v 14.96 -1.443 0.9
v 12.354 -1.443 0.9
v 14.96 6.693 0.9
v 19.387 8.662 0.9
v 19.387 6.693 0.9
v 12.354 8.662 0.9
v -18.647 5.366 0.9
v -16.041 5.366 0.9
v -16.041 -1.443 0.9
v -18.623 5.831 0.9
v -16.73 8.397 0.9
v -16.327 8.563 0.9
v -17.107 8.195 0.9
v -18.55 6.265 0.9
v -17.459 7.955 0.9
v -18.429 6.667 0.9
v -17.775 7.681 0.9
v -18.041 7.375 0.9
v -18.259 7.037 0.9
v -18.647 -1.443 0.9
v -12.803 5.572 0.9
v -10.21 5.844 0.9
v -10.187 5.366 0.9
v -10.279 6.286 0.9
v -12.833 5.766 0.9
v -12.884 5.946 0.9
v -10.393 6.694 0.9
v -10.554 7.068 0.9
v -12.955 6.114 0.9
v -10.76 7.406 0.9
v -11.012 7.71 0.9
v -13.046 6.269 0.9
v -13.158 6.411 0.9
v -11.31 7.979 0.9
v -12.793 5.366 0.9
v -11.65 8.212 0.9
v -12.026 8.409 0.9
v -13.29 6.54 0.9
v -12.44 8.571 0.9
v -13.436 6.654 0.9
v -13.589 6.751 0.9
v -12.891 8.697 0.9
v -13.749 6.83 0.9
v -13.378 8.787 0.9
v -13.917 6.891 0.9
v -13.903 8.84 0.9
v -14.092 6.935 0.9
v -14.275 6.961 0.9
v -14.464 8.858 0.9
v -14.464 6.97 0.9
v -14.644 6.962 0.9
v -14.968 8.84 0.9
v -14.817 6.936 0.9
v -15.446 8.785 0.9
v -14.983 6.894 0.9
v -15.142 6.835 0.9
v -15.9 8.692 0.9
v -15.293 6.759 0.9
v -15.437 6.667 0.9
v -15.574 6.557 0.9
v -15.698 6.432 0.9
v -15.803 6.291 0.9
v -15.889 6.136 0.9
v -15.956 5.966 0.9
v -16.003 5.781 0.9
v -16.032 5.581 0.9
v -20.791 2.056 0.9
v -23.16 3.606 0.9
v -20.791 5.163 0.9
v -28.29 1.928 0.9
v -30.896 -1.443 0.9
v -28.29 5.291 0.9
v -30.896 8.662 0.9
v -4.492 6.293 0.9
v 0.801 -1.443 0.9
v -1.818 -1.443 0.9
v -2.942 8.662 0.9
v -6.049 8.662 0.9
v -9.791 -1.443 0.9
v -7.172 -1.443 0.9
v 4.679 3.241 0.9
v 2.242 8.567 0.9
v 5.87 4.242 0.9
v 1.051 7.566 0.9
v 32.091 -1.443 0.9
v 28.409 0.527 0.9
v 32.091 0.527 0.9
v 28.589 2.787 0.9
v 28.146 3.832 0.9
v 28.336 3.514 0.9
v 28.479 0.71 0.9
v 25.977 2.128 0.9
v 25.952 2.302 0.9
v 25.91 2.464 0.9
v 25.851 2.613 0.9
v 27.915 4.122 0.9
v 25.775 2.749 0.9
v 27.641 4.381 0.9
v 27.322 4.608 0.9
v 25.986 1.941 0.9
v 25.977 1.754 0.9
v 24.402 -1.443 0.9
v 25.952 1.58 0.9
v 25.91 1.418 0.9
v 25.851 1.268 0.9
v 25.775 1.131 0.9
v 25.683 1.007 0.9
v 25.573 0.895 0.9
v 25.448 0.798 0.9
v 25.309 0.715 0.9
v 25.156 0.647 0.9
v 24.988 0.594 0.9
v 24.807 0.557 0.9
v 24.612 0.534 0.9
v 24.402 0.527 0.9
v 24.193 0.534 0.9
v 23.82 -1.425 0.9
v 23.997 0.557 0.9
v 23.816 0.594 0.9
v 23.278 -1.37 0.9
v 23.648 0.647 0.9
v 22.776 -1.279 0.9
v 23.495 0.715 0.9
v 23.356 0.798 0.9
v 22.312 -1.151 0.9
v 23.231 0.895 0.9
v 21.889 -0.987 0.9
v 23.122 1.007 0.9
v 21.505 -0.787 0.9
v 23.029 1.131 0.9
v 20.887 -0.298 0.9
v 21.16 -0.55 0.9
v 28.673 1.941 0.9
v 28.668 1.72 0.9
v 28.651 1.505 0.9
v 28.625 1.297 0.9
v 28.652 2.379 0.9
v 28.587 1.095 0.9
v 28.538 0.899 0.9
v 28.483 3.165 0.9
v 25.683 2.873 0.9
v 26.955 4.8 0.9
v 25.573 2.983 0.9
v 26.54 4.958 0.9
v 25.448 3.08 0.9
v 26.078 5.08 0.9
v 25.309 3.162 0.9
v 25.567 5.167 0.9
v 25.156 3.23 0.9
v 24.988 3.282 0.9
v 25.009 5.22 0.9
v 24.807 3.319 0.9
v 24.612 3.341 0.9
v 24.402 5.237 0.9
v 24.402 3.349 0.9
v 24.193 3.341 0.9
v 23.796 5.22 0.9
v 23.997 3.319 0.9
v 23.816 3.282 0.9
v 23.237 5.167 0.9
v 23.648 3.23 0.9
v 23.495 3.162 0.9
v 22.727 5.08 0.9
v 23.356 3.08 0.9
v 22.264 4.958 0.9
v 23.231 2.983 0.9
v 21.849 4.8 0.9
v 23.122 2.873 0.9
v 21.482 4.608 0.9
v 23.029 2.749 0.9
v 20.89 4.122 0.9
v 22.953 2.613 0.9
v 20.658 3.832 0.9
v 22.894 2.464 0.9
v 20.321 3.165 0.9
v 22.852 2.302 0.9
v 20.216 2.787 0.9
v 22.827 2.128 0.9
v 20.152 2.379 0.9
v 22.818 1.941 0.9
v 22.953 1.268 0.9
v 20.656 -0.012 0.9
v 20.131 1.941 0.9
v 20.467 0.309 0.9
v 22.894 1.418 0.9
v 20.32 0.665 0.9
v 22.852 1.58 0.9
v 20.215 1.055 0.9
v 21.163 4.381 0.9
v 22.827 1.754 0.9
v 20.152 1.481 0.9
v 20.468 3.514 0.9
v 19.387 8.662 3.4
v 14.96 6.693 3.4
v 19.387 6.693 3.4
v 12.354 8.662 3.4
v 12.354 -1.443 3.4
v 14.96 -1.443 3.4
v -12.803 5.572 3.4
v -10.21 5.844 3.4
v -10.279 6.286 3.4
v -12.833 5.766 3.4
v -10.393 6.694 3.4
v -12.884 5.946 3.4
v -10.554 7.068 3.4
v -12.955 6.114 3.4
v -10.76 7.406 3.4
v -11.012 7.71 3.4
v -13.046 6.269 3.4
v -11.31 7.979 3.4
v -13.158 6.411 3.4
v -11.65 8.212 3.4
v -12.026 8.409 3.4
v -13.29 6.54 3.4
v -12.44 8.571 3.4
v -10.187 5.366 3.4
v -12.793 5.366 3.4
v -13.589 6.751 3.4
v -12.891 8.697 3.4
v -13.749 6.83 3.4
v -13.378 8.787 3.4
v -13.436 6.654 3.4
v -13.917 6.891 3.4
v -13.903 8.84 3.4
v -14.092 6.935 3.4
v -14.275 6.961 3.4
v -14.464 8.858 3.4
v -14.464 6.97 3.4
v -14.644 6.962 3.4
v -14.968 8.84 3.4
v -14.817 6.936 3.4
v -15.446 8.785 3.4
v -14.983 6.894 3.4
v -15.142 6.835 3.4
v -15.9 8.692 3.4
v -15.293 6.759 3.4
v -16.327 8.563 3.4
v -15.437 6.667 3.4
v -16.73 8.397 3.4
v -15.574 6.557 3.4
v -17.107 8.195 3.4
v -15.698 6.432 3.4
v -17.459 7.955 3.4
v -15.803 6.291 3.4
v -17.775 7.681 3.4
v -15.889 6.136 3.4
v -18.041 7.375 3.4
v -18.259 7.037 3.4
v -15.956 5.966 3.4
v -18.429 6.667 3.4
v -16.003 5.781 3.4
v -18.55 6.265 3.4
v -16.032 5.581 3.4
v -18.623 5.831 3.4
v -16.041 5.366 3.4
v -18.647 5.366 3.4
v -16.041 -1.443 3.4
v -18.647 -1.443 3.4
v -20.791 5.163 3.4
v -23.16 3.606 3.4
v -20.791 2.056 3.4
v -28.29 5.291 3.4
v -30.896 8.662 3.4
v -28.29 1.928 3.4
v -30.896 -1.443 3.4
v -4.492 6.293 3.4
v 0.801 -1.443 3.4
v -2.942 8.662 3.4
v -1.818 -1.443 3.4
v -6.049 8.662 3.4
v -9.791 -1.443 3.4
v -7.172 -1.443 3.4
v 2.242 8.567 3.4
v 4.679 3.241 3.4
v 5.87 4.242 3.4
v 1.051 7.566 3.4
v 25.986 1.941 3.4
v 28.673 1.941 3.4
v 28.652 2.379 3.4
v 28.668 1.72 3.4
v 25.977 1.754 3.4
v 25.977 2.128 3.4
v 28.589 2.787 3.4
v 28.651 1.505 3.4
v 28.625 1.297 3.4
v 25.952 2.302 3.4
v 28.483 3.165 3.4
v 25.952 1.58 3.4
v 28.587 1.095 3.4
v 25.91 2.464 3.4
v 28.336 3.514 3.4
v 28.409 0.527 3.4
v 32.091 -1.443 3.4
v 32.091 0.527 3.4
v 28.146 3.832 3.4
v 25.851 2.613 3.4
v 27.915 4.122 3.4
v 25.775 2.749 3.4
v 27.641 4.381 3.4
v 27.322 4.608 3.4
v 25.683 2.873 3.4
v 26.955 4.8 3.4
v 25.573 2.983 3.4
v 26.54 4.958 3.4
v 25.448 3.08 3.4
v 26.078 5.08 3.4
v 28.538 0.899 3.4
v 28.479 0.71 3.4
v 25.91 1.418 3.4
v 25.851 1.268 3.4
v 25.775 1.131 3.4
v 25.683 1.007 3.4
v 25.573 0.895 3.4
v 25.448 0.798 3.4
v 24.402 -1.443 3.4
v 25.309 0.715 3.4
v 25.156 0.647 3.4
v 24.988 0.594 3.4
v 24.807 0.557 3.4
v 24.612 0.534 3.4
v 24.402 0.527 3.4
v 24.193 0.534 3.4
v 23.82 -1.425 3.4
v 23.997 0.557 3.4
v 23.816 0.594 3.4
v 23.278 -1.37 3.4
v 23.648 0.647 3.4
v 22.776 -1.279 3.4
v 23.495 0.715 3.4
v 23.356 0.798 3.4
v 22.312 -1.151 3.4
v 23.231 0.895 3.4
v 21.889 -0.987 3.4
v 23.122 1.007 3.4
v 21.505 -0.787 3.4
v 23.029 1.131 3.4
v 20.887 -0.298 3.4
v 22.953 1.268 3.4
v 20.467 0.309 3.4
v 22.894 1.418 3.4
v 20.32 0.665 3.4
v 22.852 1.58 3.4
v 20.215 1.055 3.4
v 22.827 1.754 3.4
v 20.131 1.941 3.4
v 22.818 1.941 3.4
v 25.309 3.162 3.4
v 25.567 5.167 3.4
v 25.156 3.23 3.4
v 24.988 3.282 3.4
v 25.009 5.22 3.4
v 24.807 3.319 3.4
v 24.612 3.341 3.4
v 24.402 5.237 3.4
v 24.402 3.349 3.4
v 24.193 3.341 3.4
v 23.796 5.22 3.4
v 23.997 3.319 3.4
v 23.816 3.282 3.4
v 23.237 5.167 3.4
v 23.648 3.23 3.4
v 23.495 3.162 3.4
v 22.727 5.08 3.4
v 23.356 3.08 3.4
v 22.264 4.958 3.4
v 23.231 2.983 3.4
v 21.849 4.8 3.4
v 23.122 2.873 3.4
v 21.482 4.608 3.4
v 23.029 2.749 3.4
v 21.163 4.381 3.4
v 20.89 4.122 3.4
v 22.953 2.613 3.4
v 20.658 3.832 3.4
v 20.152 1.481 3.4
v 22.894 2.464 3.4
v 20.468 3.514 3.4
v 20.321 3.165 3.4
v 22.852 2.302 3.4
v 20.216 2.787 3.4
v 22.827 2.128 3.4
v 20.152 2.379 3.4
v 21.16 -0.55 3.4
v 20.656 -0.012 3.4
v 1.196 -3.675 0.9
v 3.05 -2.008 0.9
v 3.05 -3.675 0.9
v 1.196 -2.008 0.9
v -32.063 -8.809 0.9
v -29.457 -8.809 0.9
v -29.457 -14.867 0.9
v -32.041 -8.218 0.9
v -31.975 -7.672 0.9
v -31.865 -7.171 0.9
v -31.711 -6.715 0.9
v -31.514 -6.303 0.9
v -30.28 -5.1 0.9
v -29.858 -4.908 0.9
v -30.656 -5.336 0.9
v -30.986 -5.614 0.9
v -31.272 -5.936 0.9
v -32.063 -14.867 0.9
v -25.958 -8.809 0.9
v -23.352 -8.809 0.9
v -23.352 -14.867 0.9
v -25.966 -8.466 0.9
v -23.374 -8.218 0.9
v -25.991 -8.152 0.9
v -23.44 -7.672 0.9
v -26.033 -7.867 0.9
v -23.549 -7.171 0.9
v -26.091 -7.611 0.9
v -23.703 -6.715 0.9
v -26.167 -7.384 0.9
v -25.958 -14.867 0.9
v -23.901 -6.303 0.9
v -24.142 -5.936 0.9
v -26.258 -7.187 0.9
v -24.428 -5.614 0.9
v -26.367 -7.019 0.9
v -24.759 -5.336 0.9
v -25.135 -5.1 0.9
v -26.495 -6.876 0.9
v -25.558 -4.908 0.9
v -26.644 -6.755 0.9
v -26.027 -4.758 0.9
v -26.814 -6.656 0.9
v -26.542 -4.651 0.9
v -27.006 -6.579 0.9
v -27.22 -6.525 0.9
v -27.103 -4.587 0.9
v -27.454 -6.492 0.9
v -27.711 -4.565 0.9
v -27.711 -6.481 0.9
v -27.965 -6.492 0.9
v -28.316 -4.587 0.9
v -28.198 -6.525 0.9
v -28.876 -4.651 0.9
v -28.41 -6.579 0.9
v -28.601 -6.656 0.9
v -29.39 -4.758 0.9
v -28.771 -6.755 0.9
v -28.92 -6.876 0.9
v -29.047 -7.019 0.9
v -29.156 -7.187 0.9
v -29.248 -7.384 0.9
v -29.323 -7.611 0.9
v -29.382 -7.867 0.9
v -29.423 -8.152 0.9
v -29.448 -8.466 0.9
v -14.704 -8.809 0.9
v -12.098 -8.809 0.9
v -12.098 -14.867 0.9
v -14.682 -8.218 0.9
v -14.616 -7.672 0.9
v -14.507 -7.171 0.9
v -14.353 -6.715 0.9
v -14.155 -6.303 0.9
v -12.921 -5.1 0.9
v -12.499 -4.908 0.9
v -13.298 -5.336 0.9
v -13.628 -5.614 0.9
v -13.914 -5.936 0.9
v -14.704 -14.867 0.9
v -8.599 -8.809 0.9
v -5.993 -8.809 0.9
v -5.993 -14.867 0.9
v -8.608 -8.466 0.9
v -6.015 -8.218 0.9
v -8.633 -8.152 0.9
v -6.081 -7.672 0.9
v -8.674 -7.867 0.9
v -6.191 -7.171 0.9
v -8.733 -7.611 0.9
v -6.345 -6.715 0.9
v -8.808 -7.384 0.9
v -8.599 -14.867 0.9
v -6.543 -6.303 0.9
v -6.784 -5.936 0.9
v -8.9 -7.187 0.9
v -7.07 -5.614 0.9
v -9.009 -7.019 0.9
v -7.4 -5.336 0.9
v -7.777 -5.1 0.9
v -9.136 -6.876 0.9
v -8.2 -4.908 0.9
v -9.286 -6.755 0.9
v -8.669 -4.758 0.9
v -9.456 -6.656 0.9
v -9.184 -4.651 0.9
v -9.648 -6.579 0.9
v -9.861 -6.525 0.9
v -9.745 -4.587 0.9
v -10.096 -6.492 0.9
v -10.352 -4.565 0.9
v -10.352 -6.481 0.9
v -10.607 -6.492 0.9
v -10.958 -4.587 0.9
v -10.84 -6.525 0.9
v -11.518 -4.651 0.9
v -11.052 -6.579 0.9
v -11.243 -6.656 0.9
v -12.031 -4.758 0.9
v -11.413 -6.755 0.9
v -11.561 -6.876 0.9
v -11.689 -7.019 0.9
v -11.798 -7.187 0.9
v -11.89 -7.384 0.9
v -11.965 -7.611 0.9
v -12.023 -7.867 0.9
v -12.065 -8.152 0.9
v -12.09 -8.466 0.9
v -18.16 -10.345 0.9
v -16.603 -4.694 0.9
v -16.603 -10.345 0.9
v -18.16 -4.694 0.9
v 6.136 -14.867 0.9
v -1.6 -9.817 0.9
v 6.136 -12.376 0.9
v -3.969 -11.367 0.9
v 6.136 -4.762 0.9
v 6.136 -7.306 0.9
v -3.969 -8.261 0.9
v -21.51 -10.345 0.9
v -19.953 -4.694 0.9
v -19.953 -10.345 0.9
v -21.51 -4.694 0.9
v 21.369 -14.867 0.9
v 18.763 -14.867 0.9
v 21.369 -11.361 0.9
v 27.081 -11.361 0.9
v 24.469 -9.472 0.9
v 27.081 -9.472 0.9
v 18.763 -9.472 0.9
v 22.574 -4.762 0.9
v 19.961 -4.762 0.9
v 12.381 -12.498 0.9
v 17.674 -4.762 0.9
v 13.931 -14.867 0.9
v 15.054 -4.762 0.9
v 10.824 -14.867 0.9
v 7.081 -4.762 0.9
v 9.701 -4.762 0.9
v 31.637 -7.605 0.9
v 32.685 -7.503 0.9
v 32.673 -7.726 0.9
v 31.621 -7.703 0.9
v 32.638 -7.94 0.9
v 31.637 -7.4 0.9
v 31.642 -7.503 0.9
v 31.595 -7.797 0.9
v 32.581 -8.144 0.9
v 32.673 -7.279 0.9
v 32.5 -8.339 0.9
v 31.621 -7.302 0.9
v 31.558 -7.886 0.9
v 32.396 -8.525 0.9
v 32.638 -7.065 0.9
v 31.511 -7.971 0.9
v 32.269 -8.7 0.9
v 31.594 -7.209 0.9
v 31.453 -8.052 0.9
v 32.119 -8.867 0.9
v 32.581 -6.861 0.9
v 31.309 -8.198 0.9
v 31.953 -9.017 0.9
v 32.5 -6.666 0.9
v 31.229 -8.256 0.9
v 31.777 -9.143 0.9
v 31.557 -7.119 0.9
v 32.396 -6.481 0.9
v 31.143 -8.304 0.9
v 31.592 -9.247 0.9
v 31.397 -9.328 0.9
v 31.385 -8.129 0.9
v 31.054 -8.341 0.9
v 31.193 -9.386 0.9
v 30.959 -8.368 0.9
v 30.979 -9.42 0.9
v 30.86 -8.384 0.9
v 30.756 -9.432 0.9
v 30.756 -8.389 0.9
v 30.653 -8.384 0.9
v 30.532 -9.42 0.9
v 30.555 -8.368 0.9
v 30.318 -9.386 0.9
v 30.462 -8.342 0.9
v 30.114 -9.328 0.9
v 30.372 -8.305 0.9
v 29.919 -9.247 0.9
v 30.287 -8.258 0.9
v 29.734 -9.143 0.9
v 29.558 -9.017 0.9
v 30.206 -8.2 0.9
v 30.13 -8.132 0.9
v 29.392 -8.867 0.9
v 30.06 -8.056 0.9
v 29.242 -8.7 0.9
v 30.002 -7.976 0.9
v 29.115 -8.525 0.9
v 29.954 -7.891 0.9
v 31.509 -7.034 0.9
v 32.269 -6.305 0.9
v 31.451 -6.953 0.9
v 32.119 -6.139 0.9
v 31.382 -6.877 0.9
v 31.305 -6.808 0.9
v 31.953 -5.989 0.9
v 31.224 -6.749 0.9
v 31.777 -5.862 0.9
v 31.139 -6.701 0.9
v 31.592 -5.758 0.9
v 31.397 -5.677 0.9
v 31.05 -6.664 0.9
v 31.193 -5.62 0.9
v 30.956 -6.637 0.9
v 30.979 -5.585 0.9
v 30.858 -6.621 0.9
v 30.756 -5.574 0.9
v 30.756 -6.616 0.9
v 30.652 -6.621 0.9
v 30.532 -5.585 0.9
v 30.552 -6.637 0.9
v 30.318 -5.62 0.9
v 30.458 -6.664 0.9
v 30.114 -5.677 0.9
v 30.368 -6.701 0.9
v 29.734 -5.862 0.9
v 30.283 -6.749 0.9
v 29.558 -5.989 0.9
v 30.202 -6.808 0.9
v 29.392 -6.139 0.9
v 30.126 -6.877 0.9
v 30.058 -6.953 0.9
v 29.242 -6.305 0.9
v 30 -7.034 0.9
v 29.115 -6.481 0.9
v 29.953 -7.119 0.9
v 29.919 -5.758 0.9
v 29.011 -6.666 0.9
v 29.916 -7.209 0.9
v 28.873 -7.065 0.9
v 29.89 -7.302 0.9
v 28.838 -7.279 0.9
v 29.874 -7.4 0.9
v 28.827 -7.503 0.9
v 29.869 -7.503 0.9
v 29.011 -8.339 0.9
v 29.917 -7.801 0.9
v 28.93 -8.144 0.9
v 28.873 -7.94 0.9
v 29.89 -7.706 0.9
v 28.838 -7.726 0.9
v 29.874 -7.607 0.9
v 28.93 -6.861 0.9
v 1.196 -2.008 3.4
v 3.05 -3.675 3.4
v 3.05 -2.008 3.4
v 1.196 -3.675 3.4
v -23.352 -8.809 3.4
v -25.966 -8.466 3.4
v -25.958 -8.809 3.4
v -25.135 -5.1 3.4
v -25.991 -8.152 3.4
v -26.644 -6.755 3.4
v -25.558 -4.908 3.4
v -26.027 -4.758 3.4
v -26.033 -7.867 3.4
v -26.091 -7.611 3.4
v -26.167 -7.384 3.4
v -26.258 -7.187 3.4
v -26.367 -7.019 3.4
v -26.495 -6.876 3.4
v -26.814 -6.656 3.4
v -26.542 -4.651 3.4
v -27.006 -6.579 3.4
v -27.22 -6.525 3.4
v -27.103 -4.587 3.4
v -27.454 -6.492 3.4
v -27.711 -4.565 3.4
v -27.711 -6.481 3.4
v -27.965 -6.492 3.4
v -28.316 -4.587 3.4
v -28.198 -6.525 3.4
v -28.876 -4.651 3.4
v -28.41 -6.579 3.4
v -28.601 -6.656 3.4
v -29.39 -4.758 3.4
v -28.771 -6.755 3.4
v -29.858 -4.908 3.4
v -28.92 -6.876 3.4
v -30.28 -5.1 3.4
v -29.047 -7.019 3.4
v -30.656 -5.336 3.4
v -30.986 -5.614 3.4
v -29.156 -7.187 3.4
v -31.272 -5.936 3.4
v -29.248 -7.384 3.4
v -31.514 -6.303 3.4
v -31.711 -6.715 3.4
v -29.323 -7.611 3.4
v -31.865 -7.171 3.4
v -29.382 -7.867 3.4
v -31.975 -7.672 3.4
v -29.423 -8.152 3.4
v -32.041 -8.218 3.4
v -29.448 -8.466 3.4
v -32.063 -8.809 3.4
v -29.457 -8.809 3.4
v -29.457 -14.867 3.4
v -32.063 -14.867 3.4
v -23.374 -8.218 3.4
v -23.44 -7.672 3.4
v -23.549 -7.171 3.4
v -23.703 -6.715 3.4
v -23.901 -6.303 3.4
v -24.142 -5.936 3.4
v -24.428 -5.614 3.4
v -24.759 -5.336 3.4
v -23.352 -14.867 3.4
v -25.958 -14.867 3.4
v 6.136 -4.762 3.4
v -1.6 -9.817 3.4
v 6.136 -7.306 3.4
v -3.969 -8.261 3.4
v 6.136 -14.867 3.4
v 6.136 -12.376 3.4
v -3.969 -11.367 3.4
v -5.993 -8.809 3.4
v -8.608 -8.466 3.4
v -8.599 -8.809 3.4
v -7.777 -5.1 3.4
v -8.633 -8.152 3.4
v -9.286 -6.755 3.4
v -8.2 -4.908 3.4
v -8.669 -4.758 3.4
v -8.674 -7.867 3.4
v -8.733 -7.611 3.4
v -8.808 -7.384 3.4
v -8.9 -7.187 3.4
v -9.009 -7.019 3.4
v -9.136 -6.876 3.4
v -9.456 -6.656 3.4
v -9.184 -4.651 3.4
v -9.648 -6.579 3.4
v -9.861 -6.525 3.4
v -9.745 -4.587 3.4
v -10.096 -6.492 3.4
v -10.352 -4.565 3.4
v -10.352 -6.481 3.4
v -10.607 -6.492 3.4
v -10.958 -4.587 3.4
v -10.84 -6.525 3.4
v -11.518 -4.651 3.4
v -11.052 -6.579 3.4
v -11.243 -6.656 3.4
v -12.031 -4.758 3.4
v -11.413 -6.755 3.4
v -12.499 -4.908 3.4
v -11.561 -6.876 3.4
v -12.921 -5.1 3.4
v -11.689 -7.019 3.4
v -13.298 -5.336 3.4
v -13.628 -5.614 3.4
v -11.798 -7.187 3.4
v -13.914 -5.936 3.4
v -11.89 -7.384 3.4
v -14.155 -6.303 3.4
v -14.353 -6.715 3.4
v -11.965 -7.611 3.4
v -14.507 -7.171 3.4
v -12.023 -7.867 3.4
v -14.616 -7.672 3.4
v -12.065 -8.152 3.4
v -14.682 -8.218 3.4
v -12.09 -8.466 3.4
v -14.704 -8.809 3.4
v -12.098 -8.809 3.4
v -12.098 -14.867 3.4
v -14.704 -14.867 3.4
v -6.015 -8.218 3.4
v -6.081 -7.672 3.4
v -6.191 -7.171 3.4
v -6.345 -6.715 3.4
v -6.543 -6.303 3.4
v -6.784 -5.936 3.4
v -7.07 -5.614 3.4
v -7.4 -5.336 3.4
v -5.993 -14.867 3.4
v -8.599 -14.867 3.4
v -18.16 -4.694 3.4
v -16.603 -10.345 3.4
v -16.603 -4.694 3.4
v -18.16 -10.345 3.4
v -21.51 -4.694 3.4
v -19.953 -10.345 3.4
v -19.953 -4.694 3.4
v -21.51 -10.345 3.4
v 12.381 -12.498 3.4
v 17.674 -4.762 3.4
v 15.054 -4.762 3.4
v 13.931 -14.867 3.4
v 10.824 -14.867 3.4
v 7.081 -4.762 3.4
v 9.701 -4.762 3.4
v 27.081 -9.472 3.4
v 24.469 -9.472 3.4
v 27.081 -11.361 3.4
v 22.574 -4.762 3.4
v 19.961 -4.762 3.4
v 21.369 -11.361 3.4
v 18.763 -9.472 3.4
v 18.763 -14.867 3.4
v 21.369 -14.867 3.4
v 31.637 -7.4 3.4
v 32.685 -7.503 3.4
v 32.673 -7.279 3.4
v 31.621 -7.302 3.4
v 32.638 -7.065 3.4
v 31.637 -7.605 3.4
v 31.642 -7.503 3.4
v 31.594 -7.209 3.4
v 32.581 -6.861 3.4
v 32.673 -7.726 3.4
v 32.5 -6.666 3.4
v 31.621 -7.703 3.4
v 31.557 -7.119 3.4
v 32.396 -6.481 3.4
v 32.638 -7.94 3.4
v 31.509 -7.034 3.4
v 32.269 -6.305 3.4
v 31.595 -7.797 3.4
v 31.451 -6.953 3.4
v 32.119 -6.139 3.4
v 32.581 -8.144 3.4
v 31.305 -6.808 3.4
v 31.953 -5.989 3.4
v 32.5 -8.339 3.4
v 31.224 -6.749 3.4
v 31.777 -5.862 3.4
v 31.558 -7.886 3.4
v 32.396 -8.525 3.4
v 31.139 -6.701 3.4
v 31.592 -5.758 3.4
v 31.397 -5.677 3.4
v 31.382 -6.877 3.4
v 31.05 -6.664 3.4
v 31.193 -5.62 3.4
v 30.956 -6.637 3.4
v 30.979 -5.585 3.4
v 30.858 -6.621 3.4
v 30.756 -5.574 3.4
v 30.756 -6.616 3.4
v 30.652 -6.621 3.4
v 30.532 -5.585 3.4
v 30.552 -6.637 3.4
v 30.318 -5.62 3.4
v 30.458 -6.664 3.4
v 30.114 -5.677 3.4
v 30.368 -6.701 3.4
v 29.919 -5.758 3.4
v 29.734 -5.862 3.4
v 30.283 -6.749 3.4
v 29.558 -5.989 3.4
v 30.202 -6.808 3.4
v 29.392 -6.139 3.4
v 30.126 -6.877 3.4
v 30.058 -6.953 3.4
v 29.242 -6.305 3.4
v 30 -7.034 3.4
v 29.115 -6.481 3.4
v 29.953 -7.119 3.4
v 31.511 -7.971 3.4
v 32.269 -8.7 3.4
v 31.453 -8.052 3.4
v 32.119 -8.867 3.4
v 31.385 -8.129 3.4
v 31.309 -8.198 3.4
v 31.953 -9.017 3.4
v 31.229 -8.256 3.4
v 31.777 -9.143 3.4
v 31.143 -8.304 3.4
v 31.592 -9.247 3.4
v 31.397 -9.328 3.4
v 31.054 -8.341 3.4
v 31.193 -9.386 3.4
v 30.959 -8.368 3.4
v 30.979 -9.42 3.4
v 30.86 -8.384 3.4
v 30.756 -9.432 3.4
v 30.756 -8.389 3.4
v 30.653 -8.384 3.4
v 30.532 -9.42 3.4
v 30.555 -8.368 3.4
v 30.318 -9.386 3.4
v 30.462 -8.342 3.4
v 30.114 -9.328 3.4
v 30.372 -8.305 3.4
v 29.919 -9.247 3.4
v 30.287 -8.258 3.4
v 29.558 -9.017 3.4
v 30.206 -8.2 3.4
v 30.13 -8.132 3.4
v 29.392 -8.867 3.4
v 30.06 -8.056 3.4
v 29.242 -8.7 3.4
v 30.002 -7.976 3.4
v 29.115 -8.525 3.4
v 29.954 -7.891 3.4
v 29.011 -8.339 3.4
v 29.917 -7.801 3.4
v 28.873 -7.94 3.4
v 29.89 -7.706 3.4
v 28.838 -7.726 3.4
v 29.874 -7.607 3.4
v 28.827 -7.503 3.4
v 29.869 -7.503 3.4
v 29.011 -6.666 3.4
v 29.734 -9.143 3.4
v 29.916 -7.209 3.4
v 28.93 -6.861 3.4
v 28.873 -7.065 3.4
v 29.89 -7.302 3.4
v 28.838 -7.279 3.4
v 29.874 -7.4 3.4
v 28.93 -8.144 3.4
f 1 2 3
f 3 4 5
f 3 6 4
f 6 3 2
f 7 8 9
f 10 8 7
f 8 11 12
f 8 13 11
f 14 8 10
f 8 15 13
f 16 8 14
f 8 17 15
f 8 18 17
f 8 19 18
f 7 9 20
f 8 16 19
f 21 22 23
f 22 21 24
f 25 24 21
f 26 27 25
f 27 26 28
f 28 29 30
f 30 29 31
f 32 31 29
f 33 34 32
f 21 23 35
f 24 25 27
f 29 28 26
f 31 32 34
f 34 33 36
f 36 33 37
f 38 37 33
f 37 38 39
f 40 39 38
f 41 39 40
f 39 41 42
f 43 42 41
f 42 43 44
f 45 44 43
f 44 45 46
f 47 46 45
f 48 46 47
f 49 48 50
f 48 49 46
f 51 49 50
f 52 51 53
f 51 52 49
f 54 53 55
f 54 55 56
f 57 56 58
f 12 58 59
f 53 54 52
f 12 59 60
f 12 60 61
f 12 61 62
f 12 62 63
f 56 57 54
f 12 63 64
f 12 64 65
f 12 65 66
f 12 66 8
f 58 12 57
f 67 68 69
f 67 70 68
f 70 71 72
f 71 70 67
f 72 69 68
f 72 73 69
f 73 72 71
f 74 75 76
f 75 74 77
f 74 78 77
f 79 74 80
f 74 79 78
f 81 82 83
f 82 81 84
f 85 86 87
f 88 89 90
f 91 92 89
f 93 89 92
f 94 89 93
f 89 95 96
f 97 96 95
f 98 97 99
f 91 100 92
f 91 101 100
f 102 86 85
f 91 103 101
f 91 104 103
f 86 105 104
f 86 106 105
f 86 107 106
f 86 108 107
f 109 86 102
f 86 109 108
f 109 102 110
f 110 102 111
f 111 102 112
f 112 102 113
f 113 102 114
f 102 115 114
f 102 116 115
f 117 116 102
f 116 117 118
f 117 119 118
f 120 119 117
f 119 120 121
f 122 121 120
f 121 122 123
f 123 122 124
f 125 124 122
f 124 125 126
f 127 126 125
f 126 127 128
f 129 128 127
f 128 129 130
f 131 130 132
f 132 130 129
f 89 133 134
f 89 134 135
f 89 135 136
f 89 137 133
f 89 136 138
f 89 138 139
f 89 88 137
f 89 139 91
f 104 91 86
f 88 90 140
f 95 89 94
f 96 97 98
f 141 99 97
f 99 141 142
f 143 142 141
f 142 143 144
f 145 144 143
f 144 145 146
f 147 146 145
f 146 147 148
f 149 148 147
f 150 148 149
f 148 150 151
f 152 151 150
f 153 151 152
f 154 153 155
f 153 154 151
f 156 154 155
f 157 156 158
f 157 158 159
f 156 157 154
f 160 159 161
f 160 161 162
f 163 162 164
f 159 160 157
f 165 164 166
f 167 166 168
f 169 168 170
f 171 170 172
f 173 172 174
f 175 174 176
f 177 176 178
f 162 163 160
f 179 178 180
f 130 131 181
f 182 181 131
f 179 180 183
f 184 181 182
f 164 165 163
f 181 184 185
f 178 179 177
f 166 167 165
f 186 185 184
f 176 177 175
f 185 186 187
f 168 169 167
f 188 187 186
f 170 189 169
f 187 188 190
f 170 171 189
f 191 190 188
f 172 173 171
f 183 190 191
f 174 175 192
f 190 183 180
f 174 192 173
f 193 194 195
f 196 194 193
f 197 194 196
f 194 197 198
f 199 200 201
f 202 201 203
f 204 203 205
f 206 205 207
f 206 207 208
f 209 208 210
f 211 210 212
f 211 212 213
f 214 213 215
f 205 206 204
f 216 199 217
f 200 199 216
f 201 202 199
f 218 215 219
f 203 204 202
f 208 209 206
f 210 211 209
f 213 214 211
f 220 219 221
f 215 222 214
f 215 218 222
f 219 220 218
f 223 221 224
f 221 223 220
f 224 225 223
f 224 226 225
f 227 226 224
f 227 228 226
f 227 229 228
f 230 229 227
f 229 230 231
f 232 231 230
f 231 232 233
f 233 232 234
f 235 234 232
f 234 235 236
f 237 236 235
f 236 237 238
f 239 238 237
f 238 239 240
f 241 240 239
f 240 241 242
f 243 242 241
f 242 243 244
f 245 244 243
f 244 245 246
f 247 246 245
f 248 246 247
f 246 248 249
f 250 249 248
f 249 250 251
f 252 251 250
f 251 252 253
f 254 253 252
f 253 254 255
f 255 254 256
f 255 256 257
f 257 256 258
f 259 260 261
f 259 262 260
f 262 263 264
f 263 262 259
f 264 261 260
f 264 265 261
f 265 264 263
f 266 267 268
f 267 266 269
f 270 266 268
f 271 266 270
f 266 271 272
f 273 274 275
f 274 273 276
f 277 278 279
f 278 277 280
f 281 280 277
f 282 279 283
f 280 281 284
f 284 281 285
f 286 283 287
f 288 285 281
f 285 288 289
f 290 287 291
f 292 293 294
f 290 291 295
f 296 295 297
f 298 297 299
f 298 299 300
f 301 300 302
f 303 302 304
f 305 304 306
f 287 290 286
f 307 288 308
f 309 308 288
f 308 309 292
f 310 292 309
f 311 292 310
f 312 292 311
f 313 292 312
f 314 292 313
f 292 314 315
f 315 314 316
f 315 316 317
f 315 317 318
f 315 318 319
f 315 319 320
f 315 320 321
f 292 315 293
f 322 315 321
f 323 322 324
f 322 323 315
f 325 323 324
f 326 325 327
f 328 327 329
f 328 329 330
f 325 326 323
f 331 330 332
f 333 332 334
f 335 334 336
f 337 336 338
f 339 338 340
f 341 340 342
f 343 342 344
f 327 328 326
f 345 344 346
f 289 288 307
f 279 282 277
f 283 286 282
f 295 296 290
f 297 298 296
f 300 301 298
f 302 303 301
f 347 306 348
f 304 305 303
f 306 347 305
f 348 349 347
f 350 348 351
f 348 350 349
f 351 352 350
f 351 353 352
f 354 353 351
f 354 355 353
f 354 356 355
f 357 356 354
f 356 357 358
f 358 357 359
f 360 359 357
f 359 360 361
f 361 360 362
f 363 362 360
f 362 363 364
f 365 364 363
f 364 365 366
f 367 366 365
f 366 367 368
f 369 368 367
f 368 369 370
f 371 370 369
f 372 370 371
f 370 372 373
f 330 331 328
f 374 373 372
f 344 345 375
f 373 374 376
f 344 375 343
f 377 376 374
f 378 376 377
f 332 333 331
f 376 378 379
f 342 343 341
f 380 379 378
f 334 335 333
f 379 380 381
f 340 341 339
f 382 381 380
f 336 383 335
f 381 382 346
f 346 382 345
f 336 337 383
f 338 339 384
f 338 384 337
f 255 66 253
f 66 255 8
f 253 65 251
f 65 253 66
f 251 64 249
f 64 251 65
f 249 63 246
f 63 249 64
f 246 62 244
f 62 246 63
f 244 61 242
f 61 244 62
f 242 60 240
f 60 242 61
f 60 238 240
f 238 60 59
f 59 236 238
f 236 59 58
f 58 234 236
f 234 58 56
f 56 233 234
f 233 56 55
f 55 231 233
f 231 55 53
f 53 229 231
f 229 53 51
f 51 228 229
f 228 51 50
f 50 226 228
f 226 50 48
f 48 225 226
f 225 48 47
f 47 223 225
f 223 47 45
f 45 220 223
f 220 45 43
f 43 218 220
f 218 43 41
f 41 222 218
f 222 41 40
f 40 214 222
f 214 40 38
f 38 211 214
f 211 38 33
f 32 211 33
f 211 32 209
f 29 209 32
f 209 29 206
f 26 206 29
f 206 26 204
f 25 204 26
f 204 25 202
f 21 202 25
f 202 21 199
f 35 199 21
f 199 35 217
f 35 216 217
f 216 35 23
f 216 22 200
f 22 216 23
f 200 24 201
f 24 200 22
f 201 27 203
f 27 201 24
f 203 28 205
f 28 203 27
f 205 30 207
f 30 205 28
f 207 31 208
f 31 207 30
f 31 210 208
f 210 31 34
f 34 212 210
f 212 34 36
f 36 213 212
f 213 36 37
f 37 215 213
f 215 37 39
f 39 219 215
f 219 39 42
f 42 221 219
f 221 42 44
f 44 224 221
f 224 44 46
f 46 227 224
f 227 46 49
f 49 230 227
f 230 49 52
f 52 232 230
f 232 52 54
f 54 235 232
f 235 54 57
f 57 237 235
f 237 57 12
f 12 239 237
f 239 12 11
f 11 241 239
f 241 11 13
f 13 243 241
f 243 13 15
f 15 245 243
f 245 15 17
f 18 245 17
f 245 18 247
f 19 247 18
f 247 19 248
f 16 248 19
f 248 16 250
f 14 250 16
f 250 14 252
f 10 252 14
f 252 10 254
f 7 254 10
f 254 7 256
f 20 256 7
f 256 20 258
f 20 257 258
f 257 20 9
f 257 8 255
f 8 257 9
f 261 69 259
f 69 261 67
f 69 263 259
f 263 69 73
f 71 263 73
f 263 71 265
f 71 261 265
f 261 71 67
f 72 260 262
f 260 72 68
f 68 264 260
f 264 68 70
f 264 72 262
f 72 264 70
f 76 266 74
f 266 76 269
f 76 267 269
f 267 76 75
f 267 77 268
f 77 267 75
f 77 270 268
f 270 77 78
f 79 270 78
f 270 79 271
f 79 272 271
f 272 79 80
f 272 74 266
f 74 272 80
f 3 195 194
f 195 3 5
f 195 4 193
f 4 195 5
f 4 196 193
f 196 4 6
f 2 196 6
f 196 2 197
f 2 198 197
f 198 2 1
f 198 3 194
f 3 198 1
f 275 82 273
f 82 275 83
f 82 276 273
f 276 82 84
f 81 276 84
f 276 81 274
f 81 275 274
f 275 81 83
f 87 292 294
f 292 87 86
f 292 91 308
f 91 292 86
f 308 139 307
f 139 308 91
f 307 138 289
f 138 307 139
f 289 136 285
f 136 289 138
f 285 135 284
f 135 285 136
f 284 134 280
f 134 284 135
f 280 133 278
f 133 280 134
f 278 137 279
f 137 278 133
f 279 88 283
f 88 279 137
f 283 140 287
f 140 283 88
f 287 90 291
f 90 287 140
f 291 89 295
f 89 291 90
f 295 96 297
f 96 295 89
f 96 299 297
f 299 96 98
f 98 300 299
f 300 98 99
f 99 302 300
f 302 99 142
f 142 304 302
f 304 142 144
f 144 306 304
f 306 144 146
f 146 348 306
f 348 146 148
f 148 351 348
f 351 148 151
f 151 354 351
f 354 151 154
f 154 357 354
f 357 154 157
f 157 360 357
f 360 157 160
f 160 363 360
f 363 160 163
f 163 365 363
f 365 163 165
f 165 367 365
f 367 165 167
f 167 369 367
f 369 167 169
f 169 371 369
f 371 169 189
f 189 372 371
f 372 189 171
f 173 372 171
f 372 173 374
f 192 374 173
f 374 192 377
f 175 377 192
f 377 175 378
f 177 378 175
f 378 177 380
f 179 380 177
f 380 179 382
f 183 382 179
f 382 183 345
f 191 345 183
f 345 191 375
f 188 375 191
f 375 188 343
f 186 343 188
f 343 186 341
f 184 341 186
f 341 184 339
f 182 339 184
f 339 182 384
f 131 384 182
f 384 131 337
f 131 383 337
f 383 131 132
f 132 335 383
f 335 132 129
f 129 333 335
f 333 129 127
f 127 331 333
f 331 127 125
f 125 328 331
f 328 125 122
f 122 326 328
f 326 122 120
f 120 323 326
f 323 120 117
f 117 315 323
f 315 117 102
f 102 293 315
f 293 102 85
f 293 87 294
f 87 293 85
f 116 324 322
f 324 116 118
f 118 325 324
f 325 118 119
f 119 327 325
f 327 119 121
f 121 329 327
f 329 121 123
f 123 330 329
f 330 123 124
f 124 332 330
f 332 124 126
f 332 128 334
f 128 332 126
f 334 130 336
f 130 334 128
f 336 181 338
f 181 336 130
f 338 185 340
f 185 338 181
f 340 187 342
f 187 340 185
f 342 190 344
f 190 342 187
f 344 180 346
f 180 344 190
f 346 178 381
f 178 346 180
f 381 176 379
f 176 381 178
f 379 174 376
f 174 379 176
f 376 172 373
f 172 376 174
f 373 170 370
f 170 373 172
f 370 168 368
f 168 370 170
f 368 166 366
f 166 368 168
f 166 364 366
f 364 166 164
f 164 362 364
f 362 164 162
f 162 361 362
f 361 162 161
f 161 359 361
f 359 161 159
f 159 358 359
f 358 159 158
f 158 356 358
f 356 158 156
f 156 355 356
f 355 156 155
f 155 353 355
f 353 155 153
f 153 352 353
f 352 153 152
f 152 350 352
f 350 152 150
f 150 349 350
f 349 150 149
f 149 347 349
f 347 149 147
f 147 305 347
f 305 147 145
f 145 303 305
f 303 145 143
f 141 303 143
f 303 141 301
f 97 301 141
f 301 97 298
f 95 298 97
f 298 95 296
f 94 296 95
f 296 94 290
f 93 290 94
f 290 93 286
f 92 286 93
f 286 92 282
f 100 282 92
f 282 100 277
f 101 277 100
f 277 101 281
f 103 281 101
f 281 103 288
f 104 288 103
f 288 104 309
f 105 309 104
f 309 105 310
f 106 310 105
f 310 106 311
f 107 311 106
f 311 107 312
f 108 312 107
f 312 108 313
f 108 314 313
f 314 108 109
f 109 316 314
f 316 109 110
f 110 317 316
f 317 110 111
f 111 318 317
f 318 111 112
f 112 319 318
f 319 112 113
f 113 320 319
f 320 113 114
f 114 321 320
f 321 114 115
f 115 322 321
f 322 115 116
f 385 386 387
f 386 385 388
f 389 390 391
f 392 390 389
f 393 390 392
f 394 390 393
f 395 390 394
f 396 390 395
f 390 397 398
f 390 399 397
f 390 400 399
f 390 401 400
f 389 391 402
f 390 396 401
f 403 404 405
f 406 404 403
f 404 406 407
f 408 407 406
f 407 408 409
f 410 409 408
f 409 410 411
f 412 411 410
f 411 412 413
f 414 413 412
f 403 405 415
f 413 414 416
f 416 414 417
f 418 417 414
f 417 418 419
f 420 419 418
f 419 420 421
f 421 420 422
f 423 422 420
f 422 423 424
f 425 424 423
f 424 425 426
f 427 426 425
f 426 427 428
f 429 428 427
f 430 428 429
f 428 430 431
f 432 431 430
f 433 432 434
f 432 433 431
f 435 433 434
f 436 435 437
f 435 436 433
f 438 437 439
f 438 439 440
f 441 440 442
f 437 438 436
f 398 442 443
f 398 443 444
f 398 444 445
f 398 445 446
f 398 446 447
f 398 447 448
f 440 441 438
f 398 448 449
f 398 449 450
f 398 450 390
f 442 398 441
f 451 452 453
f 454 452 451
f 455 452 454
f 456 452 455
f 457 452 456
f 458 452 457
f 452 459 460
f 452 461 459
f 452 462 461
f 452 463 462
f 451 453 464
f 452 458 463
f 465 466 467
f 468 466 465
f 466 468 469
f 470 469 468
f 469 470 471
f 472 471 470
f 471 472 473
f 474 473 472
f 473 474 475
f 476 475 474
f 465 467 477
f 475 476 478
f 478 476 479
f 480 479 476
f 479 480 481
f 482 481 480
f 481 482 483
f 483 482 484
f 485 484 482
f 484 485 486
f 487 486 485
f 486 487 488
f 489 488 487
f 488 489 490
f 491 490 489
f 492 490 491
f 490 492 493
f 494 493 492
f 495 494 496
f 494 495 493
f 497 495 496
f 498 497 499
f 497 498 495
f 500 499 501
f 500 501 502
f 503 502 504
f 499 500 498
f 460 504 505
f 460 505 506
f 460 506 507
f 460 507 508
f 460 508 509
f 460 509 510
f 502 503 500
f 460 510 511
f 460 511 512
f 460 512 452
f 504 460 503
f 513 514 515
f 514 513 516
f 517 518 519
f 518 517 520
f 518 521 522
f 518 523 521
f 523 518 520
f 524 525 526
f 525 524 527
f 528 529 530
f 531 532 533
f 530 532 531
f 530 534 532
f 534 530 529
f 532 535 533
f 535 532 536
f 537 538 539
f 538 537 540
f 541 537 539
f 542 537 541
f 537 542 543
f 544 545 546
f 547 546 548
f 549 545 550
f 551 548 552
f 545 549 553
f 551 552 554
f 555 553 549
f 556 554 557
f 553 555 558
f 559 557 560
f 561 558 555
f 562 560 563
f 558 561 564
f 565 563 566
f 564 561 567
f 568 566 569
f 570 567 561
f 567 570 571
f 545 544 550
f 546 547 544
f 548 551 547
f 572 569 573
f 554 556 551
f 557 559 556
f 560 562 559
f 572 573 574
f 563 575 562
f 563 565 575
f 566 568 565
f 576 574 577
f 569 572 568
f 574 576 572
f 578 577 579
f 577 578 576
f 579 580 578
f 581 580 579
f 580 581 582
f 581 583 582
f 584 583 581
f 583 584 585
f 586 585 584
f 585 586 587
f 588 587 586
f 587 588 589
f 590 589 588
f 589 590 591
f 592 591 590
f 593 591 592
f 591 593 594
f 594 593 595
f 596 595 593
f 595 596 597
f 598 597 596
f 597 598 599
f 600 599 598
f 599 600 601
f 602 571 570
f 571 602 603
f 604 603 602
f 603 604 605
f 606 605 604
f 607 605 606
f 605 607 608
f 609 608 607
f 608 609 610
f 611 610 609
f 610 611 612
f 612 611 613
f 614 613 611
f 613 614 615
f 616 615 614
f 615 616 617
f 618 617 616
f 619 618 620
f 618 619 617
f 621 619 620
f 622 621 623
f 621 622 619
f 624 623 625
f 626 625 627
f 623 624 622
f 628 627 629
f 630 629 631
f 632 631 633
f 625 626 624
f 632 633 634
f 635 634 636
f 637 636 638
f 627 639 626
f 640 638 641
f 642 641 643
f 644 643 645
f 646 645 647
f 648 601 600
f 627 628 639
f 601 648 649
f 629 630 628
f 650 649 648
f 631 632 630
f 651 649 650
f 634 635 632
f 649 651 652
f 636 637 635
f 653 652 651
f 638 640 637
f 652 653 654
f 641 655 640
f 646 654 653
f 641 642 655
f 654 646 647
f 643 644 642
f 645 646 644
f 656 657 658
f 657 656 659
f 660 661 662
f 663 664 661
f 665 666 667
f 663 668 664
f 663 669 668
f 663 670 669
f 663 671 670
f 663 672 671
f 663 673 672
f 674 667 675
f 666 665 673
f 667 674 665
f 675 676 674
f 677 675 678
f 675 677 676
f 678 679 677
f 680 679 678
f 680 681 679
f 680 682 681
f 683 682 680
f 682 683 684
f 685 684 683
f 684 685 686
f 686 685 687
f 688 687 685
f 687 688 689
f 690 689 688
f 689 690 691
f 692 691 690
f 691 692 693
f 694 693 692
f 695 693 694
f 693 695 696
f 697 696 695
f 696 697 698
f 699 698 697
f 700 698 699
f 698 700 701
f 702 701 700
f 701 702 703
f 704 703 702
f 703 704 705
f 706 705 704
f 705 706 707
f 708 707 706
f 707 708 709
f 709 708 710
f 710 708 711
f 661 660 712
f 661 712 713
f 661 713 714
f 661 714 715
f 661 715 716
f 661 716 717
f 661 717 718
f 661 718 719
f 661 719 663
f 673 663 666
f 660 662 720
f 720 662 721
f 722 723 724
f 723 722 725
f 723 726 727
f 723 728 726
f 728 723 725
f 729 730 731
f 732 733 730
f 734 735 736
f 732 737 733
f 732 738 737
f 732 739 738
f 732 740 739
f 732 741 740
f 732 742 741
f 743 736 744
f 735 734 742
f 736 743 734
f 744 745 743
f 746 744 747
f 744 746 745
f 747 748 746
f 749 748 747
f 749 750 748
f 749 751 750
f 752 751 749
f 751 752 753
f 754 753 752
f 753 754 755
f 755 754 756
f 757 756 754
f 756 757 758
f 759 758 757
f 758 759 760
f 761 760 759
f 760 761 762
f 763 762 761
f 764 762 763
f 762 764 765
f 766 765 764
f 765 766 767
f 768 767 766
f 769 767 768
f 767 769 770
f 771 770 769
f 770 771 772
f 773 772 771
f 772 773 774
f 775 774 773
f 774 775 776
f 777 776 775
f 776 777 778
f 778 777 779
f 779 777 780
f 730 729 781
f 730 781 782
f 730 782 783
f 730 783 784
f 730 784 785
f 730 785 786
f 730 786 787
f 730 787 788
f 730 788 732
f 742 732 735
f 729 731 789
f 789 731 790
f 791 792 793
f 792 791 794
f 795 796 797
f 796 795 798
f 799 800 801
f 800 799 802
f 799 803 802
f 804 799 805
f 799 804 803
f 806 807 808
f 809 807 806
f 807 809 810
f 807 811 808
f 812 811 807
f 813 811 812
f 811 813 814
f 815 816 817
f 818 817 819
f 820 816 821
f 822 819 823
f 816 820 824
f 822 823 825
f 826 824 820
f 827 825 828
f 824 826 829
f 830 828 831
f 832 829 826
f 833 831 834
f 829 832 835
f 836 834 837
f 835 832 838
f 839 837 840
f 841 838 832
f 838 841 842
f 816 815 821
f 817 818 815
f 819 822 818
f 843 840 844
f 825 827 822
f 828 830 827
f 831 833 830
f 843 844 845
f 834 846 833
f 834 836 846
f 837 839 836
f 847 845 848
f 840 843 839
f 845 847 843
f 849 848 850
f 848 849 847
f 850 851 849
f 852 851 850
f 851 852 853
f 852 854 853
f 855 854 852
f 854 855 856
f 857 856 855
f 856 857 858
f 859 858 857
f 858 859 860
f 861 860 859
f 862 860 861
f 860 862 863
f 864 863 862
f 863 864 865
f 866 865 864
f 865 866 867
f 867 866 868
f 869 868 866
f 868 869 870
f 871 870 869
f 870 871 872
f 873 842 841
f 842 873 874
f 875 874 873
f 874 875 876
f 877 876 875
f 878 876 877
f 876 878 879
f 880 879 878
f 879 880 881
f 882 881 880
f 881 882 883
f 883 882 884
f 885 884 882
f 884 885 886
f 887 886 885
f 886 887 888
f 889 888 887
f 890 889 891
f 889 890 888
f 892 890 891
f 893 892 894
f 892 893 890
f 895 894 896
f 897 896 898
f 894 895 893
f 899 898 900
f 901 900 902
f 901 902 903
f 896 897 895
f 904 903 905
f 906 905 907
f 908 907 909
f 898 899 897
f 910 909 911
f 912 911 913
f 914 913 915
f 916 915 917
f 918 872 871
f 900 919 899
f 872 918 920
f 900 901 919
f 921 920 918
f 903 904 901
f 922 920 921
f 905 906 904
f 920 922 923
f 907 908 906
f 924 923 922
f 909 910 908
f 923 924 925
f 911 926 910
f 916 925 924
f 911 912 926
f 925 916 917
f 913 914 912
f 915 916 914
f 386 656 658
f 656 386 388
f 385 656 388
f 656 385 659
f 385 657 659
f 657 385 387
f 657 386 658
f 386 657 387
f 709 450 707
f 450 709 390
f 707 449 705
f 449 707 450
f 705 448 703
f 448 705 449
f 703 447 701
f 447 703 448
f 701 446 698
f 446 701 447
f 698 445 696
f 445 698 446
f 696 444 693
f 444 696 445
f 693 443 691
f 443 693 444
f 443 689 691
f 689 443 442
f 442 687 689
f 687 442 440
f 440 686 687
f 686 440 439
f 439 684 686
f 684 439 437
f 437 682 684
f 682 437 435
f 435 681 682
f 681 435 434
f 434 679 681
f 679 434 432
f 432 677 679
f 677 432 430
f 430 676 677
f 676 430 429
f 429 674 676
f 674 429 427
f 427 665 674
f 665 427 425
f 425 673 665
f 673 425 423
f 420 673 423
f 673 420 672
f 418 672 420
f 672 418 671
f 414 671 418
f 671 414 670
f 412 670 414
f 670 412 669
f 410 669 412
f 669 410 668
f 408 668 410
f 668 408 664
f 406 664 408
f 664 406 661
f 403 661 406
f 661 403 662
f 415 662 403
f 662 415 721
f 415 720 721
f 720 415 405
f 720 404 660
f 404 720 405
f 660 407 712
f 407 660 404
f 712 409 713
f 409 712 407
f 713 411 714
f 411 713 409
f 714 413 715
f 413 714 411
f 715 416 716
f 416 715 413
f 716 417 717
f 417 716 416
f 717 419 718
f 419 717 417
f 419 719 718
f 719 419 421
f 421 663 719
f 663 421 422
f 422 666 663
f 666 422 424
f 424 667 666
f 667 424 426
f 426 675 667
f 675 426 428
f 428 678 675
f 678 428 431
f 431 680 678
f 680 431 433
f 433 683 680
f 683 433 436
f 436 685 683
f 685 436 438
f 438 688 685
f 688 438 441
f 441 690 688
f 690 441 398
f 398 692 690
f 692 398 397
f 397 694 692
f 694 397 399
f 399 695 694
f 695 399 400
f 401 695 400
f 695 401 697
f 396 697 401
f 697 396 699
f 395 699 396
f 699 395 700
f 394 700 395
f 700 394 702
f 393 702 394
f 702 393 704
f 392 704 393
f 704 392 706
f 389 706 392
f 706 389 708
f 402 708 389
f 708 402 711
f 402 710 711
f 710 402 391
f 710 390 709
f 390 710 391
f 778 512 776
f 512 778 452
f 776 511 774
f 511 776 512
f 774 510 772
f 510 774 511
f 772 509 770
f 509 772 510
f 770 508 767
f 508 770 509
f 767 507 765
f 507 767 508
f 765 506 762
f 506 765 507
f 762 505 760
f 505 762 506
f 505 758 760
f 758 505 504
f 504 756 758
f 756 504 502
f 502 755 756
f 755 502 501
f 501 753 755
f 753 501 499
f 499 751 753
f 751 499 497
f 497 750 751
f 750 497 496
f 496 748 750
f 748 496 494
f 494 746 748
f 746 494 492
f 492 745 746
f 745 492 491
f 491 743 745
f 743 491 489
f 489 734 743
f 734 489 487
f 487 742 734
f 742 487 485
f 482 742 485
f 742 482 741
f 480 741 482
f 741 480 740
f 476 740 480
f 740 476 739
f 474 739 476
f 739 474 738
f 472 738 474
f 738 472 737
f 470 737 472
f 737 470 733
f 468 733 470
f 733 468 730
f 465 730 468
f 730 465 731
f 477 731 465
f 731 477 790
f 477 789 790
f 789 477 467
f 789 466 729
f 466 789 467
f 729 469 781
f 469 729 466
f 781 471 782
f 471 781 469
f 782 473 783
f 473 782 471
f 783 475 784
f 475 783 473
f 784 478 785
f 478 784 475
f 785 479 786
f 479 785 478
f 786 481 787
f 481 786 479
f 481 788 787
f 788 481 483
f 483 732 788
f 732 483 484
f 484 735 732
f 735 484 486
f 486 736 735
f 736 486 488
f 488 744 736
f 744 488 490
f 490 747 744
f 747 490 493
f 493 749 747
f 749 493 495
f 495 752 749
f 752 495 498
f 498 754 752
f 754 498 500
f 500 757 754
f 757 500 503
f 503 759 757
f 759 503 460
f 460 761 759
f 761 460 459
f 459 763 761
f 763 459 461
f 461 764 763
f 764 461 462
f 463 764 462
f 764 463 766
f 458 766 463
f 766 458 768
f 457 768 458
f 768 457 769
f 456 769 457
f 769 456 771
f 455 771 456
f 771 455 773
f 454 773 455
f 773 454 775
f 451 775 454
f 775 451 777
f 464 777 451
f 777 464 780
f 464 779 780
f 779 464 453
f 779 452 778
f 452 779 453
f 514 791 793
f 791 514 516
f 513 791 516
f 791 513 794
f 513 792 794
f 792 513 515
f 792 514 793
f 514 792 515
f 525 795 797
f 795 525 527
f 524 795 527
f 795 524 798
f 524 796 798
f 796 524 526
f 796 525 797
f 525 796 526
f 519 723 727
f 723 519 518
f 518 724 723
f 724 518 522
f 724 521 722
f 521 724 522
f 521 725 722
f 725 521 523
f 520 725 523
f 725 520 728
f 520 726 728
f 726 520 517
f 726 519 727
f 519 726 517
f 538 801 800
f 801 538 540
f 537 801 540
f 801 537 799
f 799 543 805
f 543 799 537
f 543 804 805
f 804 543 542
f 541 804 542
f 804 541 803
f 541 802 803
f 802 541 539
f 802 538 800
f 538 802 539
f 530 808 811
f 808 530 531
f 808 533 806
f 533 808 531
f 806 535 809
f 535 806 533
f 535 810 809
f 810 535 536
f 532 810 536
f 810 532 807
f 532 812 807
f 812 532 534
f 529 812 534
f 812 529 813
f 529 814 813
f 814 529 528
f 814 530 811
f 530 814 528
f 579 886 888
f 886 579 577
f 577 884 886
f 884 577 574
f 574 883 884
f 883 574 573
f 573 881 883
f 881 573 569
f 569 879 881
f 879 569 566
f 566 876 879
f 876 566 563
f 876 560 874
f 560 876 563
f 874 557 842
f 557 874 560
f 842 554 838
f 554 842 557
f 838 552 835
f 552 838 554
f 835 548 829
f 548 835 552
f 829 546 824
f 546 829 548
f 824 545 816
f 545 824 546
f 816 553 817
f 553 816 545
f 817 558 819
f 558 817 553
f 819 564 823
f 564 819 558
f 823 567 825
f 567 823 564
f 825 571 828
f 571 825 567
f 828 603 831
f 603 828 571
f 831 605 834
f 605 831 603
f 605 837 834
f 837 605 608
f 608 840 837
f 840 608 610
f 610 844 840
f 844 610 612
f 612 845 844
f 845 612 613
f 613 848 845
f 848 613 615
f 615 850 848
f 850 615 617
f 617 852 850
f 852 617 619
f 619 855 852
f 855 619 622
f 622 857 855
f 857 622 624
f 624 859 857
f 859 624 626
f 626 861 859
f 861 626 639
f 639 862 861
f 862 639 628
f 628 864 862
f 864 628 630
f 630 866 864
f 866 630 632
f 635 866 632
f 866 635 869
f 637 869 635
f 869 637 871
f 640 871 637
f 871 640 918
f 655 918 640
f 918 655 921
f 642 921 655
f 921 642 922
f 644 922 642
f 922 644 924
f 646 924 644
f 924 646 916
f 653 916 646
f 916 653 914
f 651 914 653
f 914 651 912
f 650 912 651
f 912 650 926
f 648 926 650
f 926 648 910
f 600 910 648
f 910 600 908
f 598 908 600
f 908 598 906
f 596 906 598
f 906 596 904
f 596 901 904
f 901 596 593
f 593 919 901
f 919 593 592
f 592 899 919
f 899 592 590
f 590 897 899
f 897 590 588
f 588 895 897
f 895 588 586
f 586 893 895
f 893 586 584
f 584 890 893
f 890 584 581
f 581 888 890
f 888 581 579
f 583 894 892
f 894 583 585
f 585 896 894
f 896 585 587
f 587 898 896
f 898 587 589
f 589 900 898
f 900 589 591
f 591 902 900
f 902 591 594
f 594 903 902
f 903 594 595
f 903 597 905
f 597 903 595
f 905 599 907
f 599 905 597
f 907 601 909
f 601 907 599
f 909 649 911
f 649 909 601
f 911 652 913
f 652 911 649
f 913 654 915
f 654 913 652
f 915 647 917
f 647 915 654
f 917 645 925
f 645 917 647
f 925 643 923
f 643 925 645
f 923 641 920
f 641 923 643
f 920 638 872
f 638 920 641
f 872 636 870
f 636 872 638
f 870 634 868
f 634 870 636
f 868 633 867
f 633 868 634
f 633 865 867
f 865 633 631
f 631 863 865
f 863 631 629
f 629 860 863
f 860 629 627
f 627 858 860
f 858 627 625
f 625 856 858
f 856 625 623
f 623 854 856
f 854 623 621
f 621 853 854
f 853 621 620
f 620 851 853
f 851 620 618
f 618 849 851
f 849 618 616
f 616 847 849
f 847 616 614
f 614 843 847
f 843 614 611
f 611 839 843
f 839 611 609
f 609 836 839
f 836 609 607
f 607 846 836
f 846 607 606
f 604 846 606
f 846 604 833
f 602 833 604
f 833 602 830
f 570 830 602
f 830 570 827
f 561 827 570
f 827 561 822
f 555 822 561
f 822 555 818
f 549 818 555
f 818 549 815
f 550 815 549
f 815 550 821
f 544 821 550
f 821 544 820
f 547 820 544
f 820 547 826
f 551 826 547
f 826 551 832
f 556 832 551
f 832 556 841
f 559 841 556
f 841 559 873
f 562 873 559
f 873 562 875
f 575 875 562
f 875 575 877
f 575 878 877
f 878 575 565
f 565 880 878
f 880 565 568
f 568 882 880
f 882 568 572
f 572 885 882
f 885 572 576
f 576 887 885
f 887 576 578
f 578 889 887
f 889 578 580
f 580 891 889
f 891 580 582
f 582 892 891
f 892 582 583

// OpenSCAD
$fn = 48;
  // syllabics (overlaid on icon, tallest)
  translate([0, 3.588, 0.900]) linear_extrude(height=2.500) text("ᐅᒋᐱᐠ ᒥᓇ", size=9.981, halign="center", valign="center", font="Euphemia UCAS:style=Bold");
  translate([0, -8.588, 0.900]) linear_extrude(height=2.500) text("ᑎᐦᑎᐹᐯᔨᐤ", size=9.981, halign="center", valign="center", font="Euphemia UCAS:style=Bold");
